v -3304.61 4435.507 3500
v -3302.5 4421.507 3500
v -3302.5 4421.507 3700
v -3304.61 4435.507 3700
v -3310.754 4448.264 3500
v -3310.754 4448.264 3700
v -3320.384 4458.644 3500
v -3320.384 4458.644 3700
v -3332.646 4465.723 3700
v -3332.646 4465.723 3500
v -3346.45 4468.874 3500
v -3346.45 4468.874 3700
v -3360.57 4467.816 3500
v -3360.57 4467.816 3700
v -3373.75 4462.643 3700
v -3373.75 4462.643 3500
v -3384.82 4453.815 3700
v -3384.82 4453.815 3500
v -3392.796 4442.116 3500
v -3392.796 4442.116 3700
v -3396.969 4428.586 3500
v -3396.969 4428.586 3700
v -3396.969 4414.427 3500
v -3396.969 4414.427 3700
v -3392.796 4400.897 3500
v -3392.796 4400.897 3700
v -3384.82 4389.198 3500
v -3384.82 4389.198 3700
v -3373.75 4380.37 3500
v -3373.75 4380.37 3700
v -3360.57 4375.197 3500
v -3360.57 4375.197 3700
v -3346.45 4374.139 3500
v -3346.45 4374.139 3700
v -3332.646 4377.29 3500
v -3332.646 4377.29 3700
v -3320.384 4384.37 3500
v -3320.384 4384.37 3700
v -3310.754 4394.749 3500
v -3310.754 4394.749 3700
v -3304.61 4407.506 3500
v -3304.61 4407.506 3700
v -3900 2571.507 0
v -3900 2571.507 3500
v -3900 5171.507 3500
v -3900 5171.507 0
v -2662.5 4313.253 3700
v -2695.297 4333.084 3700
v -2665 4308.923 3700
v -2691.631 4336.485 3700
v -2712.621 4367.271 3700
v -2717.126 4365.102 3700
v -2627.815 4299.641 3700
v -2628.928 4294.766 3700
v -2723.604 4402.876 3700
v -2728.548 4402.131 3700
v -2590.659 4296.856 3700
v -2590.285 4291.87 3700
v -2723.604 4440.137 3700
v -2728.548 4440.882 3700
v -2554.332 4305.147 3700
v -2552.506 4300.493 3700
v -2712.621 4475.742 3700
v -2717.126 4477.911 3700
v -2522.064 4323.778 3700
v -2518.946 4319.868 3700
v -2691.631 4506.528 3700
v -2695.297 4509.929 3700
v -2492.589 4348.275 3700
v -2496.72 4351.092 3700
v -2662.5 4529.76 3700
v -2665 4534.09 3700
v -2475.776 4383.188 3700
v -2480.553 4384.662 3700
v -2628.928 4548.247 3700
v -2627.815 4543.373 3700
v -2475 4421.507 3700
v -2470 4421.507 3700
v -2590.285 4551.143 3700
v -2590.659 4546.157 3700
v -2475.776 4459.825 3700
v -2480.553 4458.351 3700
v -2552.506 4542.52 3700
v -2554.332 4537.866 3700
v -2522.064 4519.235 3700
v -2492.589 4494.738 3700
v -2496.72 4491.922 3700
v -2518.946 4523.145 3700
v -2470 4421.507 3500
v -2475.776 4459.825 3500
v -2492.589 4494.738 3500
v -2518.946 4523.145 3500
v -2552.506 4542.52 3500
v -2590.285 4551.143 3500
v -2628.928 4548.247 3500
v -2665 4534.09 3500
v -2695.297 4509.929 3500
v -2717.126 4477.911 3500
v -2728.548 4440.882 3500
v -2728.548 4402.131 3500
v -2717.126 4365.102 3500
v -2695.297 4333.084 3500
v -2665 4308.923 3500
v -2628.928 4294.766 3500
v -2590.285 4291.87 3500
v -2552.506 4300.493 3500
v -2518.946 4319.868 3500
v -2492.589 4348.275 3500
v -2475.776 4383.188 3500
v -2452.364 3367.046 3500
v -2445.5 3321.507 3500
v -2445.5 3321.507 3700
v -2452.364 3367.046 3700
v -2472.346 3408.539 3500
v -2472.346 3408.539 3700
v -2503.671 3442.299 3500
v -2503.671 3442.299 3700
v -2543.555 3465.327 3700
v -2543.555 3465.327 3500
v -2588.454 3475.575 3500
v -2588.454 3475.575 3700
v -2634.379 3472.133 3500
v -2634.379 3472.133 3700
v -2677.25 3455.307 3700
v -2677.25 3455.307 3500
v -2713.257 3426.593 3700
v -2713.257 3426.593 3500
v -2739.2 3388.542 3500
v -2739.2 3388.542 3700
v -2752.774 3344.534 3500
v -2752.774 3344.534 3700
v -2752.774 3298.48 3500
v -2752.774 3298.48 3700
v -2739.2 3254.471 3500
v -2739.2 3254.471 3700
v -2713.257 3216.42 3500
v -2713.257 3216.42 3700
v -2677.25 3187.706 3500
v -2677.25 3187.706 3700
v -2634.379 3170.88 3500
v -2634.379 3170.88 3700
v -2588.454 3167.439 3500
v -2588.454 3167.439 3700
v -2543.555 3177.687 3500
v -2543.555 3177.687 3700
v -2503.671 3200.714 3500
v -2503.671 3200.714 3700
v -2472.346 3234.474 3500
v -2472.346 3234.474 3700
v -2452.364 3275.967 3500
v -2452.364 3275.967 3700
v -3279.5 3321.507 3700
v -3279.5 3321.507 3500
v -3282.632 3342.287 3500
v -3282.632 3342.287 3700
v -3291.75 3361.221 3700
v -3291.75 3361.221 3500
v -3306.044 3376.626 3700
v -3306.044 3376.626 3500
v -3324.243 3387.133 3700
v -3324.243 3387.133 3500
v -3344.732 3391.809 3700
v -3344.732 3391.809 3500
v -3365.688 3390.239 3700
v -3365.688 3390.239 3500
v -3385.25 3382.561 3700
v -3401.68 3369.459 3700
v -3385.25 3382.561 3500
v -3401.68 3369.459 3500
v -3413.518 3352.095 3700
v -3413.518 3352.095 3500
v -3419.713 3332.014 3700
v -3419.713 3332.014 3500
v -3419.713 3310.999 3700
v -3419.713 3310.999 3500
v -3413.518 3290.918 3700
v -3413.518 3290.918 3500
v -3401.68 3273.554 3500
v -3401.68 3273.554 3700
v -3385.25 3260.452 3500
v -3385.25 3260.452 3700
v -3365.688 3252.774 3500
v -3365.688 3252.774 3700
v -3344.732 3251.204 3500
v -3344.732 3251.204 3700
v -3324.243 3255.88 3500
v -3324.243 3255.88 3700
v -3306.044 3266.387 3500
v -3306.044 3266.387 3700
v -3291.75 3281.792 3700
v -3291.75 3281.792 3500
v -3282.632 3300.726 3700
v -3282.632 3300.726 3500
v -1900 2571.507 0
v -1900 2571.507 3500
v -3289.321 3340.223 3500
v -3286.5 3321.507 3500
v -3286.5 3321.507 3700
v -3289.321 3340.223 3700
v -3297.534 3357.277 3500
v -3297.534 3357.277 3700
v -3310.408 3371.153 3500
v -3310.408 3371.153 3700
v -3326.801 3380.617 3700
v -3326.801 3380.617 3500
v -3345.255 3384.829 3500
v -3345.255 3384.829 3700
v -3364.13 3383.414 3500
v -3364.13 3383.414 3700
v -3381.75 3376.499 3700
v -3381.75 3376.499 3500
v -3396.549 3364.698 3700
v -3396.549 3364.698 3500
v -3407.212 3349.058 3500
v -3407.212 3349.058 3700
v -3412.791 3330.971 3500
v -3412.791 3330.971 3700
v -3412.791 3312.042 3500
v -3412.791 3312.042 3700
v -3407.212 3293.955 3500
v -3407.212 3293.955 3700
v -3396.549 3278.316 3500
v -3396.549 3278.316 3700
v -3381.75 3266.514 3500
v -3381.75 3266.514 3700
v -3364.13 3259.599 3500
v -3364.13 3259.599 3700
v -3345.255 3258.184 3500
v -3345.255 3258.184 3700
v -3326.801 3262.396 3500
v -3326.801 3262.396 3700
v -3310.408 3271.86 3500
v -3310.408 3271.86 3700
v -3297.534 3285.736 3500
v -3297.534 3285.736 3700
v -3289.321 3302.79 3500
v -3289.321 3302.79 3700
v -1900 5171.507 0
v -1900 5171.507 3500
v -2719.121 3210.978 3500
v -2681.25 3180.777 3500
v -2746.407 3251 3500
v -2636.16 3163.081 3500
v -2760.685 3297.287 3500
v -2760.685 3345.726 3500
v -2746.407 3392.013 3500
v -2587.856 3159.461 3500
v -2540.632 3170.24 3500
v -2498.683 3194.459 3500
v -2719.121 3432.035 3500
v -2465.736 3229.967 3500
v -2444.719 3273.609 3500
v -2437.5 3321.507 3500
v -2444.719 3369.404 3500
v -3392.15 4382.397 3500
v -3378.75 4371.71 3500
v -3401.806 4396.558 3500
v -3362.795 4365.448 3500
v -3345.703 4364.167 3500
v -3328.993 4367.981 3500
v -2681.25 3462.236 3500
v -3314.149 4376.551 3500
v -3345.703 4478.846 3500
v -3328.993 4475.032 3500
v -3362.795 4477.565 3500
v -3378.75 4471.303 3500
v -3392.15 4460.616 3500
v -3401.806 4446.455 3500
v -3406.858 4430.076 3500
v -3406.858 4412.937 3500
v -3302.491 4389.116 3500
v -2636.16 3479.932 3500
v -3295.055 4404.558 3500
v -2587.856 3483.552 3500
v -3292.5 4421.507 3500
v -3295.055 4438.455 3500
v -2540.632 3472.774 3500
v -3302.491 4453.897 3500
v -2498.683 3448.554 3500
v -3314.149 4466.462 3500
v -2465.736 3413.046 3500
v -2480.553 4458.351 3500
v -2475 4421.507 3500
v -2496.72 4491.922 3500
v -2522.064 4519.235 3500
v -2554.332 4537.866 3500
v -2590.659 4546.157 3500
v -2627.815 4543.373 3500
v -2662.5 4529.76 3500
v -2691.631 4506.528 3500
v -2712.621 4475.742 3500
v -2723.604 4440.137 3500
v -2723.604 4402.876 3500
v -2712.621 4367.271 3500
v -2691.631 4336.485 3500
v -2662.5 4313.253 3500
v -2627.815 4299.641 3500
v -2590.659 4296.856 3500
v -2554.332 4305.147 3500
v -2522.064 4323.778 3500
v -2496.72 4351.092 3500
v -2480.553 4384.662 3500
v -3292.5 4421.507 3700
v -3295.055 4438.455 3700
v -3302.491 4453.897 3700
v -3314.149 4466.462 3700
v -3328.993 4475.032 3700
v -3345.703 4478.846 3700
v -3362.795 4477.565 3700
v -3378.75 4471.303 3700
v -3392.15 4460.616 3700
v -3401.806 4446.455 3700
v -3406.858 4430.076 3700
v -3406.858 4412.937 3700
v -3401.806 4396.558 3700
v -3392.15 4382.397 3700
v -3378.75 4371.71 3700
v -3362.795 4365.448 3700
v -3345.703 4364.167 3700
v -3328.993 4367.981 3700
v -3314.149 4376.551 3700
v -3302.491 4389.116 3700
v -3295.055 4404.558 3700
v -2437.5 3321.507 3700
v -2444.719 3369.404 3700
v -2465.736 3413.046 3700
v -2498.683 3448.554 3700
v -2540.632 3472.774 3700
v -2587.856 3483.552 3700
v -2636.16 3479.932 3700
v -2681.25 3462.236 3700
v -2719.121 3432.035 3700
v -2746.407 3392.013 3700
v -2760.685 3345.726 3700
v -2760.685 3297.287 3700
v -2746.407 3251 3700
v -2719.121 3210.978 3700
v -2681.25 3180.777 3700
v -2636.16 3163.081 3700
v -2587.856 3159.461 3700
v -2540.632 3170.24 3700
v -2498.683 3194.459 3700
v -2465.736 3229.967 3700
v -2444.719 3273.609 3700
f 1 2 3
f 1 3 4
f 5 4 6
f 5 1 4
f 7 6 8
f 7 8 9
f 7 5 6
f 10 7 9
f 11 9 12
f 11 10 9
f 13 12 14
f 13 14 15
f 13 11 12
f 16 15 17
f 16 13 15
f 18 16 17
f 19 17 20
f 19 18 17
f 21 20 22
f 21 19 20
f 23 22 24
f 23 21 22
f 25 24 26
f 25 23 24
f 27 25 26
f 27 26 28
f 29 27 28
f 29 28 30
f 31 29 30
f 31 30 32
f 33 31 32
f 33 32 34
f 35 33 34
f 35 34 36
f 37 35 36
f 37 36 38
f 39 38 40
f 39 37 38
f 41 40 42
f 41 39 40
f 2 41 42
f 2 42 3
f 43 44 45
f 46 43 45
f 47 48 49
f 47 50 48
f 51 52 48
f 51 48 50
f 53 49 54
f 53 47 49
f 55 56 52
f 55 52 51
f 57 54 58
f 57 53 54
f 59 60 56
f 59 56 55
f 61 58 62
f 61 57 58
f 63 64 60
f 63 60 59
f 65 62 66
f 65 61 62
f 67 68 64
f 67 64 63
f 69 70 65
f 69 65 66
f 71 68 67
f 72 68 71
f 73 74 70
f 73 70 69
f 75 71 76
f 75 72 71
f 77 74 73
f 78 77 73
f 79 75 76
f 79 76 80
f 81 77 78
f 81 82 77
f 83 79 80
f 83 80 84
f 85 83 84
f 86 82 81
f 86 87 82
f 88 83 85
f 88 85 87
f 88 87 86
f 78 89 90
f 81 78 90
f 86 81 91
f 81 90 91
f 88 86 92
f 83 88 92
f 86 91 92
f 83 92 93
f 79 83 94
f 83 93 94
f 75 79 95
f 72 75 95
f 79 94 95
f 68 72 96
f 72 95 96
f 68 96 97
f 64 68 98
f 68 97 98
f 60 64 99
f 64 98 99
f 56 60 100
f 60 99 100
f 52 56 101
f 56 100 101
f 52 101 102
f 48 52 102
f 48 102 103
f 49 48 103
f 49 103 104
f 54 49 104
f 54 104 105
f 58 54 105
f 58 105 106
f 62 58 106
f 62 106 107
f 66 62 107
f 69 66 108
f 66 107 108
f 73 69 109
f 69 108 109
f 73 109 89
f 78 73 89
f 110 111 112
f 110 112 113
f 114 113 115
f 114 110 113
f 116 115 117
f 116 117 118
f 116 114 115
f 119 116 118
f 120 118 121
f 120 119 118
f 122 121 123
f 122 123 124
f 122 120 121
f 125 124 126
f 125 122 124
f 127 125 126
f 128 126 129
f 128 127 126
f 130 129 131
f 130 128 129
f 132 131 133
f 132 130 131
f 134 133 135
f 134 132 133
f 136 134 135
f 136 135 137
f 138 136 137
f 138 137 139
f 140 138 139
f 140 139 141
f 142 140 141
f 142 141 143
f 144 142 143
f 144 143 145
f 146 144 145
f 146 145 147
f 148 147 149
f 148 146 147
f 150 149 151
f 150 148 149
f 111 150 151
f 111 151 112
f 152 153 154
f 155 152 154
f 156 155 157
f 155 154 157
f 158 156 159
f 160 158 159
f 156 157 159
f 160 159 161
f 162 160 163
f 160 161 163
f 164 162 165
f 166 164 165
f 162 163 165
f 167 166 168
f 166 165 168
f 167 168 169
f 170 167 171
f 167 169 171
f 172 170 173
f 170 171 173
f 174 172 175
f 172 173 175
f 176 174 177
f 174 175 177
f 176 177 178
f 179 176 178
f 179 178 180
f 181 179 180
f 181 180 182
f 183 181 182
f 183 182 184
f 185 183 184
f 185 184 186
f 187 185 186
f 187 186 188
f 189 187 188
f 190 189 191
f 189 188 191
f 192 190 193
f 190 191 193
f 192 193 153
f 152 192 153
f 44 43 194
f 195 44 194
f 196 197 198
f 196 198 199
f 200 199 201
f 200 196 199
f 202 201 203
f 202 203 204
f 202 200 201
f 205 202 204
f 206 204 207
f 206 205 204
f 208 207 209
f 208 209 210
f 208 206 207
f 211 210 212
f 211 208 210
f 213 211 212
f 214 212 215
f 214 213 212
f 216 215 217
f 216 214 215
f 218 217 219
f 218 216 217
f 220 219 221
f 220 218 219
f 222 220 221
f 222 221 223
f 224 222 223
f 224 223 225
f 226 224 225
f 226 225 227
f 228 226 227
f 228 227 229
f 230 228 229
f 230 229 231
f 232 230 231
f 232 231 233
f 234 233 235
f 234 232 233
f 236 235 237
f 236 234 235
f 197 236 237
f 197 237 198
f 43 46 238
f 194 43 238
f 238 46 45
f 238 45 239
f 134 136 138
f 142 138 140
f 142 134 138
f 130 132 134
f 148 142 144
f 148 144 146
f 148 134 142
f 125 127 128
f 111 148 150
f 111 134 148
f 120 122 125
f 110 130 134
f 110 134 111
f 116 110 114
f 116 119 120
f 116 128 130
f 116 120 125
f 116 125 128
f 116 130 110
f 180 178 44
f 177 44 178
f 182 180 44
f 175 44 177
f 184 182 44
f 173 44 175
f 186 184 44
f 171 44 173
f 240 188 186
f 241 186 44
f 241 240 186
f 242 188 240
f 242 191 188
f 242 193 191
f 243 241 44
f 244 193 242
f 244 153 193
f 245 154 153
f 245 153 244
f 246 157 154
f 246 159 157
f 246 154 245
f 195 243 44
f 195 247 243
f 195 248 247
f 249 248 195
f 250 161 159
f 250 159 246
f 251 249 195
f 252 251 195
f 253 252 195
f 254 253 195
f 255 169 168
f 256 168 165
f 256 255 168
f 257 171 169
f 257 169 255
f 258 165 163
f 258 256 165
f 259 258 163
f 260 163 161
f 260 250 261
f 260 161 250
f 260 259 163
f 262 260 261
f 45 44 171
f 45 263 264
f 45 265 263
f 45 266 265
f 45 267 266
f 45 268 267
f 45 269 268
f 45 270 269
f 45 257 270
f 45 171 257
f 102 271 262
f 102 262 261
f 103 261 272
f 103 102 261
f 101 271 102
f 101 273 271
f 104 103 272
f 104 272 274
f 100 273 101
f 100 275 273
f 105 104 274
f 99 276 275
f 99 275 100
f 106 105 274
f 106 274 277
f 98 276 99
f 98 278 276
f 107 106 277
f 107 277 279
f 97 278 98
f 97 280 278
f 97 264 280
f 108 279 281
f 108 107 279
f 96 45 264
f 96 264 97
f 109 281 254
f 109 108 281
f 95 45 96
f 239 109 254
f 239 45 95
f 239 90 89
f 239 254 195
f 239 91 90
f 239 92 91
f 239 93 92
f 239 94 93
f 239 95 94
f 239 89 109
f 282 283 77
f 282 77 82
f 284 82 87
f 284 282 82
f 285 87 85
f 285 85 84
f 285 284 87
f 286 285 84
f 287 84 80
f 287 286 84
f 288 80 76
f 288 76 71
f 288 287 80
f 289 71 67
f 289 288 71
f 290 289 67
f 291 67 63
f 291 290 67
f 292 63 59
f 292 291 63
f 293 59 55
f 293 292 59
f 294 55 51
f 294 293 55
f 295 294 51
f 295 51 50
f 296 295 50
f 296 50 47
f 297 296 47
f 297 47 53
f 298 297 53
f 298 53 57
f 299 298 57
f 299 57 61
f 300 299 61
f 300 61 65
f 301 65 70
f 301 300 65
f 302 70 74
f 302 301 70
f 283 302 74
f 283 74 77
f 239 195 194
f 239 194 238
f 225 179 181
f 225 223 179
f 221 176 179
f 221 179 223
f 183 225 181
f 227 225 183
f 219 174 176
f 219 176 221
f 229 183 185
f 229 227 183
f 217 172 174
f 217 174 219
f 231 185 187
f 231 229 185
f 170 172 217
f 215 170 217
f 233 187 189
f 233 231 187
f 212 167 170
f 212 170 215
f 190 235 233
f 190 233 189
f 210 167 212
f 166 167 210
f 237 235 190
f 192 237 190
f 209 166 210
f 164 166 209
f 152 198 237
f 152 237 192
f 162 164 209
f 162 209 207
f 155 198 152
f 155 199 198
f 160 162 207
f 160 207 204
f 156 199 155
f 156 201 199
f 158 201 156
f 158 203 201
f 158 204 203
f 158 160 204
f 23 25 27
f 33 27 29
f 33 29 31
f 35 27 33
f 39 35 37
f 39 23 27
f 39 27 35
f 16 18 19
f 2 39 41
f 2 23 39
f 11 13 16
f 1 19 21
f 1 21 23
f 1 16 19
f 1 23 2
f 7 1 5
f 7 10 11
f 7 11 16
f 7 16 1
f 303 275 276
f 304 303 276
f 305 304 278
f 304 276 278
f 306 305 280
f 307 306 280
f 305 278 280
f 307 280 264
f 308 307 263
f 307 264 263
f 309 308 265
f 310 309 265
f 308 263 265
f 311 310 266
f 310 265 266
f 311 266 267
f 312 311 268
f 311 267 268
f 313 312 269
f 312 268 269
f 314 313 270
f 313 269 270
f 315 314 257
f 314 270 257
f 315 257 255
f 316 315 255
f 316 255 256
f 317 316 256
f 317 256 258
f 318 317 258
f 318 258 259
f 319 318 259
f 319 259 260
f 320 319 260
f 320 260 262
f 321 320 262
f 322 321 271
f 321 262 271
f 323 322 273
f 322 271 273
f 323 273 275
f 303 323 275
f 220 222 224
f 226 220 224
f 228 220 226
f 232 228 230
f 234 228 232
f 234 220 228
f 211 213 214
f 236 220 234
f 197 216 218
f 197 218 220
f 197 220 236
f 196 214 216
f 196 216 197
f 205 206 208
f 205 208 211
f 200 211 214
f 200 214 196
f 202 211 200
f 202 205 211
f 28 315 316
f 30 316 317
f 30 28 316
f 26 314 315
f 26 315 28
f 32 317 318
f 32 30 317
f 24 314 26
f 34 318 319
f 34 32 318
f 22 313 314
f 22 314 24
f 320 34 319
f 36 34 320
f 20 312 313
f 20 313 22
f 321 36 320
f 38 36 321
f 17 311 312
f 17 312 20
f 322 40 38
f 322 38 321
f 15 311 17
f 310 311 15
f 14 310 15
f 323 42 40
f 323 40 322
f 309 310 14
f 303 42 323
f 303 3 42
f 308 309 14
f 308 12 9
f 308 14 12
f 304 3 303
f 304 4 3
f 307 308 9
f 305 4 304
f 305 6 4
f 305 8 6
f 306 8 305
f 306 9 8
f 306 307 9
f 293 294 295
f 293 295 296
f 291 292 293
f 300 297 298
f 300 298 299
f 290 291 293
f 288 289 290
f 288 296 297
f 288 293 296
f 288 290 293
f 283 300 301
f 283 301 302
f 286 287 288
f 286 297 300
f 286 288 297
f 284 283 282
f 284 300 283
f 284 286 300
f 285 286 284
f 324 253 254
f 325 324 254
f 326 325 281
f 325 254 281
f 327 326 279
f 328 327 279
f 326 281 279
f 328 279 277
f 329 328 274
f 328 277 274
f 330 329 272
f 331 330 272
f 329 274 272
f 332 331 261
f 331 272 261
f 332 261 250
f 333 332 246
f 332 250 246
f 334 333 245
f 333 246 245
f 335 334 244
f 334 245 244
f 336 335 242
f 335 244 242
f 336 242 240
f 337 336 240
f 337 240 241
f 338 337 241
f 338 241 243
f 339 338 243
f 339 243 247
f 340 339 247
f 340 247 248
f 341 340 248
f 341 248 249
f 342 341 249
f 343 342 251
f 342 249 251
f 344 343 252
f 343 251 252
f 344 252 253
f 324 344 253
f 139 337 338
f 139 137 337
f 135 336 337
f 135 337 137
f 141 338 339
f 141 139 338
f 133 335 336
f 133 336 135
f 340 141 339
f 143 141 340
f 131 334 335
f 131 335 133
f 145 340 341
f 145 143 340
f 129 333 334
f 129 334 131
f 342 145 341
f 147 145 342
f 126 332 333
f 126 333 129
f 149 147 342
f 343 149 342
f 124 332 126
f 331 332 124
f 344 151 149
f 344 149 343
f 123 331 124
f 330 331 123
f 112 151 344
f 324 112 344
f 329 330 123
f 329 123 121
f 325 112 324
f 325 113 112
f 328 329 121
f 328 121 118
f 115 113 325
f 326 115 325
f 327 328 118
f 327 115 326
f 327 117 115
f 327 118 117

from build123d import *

# Parameters (mm, degrees)
SKETCH1_W      = 2000
SKETCH1_H      = 2600
EXTRUDE1_DEPTH = 3500
SKETCH2_R      = 162.5
SKETCH2_R_2    = 154.5
SKETCH2_R_3    = 70.5
SKETCH2_R_4    = 63.5
SKETCH2_R_5    = 130
SKETCH2_R_6    = 125
SKETCH2_R_7    = 57.5
SKETCH2_R_8    = 47.5
EXTRUDE2_DEPTH = 200


with BuildPart() as part:
    # Sketch1 → Extrude1 (new body)
    with BuildSketch(Plane.XY):
        with Locations((-2900, 3871.506535609)):
            Rectangle(SKETCH1_W, SKETCH1_H)
    extrude(amount=EXTRUDE1_DEPTH)

    # Sketch2 → Extrude2 (add)
    with BuildSketch(Plane.XY.offset(3500)):
        with Locations((-2600, 3321.506535609)):
            Circle(SKETCH2_R)
        with Locations((-2600, 3321.506535609)):
            Circle(SKETCH2_R_2, mode=Mode.SUBTRACT)
        with Locations((-3350, 3321.506535609)):
            Circle(SKETCH2_R_3)
        with Locations((-3350, 3321.506535609)):
            Circle(SKETCH2_R_4, mode=Mode.SUBTRACT)
        with Locations((-2600, 4421.506535609)):
            Circle(SKETCH2_R_5)
        with Locations((-2600, 4421.506535609)):
            Circle(SKETCH2_R_6, mode=Mode.SUBTRACT)
        with Locations((-3350, 4421.506535609)):
            Circle(SKETCH2_R_7)
        with Locations((-3350, 4421.506535609)):
            Circle(SKETCH2_R_8, mode=Mode.SUBTRACT)
    extrude(amount=EXTRUDE2_DEPTH)


solid = part.part
